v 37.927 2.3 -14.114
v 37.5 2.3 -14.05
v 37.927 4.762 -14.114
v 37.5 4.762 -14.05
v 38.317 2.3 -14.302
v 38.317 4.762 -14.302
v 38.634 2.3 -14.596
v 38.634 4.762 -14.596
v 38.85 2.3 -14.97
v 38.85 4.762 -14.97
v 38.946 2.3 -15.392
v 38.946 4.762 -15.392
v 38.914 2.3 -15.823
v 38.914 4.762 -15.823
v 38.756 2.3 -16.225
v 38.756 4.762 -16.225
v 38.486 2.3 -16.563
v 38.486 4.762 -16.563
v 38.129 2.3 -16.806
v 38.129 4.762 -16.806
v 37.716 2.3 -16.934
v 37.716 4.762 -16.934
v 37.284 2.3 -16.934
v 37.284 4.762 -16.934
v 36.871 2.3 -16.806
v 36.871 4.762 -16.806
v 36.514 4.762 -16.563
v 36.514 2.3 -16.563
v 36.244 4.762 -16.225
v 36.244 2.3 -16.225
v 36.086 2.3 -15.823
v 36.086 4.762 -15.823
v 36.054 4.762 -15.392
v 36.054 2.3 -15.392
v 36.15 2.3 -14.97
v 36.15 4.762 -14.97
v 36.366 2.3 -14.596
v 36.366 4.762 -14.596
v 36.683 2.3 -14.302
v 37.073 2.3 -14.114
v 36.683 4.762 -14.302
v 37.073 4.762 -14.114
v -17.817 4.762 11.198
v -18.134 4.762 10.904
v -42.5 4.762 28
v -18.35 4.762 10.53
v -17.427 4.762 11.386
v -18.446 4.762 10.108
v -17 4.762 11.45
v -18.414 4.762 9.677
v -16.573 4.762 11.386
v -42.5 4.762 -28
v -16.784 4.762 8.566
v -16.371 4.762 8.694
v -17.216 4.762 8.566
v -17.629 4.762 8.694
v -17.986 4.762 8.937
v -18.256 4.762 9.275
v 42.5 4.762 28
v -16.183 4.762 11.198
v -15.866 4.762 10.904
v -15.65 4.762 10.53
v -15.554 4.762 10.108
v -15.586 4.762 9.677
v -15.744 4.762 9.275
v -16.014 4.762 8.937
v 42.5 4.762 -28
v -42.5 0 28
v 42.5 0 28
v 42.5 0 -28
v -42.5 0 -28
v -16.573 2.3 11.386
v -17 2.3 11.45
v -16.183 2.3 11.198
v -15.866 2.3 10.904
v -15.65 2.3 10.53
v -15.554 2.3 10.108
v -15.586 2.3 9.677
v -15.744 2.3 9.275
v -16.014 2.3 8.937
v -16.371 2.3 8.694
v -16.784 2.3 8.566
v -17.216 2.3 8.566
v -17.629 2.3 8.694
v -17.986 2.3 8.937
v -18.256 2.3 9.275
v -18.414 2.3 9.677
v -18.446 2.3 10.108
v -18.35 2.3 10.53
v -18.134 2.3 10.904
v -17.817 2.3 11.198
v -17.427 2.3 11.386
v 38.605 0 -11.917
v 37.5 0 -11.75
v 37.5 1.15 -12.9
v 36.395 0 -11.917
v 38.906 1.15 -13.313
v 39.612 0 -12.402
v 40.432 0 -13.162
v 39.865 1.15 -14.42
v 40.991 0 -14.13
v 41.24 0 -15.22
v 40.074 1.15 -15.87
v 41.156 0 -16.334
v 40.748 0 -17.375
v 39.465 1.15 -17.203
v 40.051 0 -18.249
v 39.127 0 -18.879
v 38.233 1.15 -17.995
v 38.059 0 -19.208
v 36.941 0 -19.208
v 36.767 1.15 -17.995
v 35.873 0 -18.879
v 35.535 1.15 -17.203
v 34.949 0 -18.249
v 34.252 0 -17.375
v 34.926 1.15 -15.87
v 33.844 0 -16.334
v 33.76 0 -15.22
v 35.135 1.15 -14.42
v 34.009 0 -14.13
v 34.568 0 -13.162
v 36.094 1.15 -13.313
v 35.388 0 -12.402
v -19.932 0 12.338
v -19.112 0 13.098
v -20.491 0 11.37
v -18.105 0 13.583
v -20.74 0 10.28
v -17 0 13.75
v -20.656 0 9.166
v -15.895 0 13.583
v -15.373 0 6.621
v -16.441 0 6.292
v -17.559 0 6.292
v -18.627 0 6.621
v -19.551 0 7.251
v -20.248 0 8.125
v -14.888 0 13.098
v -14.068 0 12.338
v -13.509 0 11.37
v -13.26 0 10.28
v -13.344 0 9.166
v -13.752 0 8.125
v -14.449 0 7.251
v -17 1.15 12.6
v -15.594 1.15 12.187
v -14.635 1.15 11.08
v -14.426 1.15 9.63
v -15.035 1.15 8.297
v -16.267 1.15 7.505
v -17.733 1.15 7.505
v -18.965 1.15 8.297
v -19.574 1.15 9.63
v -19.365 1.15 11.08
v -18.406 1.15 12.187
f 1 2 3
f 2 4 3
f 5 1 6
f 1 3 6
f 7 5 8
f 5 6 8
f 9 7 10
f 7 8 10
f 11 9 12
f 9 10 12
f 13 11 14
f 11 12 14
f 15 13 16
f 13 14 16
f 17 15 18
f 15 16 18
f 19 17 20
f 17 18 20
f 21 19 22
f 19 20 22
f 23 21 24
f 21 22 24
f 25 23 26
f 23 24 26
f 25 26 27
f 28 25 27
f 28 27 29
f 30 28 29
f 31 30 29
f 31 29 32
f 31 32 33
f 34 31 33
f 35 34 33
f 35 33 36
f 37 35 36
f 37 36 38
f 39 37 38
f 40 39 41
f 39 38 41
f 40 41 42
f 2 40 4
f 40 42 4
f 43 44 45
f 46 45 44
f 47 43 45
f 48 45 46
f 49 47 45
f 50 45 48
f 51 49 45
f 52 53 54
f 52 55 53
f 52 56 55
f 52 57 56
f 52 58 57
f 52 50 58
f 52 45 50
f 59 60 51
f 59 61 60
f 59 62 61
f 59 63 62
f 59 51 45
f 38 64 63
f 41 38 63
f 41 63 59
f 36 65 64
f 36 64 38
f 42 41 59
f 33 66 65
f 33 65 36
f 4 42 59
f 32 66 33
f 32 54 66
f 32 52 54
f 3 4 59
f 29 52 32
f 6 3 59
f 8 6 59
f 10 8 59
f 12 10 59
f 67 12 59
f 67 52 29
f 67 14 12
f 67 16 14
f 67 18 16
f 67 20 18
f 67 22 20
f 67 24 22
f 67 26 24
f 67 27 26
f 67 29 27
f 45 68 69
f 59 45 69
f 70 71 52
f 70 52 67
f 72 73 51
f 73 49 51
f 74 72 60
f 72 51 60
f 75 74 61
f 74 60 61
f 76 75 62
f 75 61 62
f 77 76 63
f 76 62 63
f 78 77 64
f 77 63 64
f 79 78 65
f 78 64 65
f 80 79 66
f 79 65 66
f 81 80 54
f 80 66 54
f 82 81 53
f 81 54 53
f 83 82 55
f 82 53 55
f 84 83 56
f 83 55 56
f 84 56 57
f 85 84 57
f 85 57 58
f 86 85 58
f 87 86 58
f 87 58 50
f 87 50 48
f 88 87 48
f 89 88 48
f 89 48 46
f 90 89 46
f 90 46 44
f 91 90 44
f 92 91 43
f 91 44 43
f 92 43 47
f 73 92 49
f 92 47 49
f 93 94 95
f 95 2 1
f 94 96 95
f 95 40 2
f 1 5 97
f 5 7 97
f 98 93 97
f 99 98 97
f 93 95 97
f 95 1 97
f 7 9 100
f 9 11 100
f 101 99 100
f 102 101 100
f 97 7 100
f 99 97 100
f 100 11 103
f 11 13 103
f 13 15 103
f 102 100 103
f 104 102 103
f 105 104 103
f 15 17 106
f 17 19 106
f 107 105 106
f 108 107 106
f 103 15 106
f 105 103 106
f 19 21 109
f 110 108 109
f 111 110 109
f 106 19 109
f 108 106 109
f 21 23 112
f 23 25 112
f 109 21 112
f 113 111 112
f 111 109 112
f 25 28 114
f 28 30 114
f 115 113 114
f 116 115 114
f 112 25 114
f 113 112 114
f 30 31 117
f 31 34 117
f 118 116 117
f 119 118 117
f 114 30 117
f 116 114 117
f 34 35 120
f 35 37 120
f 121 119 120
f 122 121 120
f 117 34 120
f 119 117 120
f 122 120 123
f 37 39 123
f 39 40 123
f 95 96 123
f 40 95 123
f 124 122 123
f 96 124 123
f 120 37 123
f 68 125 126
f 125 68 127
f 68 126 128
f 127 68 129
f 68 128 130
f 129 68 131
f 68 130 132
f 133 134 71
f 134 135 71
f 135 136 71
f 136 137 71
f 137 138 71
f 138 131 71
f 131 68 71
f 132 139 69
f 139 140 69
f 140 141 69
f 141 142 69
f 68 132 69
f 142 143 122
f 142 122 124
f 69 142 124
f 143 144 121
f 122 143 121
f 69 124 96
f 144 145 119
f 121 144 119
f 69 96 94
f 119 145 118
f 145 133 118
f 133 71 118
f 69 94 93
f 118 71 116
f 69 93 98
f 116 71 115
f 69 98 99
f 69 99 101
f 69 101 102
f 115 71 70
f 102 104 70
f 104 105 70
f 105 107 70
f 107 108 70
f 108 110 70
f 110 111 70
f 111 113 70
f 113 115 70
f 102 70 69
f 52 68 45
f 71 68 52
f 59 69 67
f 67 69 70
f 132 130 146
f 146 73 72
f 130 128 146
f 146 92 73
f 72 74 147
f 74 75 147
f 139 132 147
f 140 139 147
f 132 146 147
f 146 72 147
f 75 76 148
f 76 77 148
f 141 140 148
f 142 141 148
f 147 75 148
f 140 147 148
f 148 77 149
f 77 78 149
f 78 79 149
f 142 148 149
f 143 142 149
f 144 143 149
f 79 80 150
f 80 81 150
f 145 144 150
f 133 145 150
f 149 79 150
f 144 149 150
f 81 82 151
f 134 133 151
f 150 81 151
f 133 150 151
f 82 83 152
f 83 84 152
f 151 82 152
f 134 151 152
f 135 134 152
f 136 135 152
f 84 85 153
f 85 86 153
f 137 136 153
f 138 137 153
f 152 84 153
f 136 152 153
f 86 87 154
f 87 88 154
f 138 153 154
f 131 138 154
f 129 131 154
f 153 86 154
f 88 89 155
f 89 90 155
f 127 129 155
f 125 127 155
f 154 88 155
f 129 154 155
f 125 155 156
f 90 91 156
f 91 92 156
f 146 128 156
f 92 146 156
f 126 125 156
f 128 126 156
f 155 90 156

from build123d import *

# Parameters (mm, degrees)
SKETCH1_W                                         = 85
SKETCH1_H                                         = 56
BOSS_EXTRUDE1_DEPTH                               = 4.7625
CSK_FOR_M2_5_FLAT_HEAD_MACHINE_SCREW1_D           = 2.9
CSK_FOR_M2_5_FLAT_HEAD_MACHINE_SCREW1_CSINK_D     = 7.5
CSK_FOR_M2_5_FLAT_HEAD_MACHINE_SCREW1_CSINK_ANGLE = 90


with BuildPart() as part:
    # Sketch1 → Boss-Extrude1 (new body)
    with BuildSketch(Plane(origin=(0, 0, 0), x_dir=(1, 0, 0), z_dir=(0, 1, 0))):
        Rectangle(SKETCH1_W, SKETCH1_H)
    extrude(amount=BOSS_EXTRUDE1_DEPTH)

    # CSK for M2.5 Flat Head Machine Screw1 (through all)
    with Locations(Plane(origin=(-17, 0, 10), x_dir=(0, 0, -1), z_dir=(0, -1, 0))):
        with Locations((0, 0), (25.5, 54.5)):
            CounterSinkHole(CSK_FOR_M2_5_FLAT_HEAD_MACHINE_SCREW1_D / 2, CSK_FOR_M2_5_FLAT_HEAD_MACHINE_SCREW1_CSINK_D / 2, counter_sink_angle=CSK_FOR_M2_5_FLAT_HEAD_MACHINE_SCREW1_CSINK_ANGLE)


solid = part.part
